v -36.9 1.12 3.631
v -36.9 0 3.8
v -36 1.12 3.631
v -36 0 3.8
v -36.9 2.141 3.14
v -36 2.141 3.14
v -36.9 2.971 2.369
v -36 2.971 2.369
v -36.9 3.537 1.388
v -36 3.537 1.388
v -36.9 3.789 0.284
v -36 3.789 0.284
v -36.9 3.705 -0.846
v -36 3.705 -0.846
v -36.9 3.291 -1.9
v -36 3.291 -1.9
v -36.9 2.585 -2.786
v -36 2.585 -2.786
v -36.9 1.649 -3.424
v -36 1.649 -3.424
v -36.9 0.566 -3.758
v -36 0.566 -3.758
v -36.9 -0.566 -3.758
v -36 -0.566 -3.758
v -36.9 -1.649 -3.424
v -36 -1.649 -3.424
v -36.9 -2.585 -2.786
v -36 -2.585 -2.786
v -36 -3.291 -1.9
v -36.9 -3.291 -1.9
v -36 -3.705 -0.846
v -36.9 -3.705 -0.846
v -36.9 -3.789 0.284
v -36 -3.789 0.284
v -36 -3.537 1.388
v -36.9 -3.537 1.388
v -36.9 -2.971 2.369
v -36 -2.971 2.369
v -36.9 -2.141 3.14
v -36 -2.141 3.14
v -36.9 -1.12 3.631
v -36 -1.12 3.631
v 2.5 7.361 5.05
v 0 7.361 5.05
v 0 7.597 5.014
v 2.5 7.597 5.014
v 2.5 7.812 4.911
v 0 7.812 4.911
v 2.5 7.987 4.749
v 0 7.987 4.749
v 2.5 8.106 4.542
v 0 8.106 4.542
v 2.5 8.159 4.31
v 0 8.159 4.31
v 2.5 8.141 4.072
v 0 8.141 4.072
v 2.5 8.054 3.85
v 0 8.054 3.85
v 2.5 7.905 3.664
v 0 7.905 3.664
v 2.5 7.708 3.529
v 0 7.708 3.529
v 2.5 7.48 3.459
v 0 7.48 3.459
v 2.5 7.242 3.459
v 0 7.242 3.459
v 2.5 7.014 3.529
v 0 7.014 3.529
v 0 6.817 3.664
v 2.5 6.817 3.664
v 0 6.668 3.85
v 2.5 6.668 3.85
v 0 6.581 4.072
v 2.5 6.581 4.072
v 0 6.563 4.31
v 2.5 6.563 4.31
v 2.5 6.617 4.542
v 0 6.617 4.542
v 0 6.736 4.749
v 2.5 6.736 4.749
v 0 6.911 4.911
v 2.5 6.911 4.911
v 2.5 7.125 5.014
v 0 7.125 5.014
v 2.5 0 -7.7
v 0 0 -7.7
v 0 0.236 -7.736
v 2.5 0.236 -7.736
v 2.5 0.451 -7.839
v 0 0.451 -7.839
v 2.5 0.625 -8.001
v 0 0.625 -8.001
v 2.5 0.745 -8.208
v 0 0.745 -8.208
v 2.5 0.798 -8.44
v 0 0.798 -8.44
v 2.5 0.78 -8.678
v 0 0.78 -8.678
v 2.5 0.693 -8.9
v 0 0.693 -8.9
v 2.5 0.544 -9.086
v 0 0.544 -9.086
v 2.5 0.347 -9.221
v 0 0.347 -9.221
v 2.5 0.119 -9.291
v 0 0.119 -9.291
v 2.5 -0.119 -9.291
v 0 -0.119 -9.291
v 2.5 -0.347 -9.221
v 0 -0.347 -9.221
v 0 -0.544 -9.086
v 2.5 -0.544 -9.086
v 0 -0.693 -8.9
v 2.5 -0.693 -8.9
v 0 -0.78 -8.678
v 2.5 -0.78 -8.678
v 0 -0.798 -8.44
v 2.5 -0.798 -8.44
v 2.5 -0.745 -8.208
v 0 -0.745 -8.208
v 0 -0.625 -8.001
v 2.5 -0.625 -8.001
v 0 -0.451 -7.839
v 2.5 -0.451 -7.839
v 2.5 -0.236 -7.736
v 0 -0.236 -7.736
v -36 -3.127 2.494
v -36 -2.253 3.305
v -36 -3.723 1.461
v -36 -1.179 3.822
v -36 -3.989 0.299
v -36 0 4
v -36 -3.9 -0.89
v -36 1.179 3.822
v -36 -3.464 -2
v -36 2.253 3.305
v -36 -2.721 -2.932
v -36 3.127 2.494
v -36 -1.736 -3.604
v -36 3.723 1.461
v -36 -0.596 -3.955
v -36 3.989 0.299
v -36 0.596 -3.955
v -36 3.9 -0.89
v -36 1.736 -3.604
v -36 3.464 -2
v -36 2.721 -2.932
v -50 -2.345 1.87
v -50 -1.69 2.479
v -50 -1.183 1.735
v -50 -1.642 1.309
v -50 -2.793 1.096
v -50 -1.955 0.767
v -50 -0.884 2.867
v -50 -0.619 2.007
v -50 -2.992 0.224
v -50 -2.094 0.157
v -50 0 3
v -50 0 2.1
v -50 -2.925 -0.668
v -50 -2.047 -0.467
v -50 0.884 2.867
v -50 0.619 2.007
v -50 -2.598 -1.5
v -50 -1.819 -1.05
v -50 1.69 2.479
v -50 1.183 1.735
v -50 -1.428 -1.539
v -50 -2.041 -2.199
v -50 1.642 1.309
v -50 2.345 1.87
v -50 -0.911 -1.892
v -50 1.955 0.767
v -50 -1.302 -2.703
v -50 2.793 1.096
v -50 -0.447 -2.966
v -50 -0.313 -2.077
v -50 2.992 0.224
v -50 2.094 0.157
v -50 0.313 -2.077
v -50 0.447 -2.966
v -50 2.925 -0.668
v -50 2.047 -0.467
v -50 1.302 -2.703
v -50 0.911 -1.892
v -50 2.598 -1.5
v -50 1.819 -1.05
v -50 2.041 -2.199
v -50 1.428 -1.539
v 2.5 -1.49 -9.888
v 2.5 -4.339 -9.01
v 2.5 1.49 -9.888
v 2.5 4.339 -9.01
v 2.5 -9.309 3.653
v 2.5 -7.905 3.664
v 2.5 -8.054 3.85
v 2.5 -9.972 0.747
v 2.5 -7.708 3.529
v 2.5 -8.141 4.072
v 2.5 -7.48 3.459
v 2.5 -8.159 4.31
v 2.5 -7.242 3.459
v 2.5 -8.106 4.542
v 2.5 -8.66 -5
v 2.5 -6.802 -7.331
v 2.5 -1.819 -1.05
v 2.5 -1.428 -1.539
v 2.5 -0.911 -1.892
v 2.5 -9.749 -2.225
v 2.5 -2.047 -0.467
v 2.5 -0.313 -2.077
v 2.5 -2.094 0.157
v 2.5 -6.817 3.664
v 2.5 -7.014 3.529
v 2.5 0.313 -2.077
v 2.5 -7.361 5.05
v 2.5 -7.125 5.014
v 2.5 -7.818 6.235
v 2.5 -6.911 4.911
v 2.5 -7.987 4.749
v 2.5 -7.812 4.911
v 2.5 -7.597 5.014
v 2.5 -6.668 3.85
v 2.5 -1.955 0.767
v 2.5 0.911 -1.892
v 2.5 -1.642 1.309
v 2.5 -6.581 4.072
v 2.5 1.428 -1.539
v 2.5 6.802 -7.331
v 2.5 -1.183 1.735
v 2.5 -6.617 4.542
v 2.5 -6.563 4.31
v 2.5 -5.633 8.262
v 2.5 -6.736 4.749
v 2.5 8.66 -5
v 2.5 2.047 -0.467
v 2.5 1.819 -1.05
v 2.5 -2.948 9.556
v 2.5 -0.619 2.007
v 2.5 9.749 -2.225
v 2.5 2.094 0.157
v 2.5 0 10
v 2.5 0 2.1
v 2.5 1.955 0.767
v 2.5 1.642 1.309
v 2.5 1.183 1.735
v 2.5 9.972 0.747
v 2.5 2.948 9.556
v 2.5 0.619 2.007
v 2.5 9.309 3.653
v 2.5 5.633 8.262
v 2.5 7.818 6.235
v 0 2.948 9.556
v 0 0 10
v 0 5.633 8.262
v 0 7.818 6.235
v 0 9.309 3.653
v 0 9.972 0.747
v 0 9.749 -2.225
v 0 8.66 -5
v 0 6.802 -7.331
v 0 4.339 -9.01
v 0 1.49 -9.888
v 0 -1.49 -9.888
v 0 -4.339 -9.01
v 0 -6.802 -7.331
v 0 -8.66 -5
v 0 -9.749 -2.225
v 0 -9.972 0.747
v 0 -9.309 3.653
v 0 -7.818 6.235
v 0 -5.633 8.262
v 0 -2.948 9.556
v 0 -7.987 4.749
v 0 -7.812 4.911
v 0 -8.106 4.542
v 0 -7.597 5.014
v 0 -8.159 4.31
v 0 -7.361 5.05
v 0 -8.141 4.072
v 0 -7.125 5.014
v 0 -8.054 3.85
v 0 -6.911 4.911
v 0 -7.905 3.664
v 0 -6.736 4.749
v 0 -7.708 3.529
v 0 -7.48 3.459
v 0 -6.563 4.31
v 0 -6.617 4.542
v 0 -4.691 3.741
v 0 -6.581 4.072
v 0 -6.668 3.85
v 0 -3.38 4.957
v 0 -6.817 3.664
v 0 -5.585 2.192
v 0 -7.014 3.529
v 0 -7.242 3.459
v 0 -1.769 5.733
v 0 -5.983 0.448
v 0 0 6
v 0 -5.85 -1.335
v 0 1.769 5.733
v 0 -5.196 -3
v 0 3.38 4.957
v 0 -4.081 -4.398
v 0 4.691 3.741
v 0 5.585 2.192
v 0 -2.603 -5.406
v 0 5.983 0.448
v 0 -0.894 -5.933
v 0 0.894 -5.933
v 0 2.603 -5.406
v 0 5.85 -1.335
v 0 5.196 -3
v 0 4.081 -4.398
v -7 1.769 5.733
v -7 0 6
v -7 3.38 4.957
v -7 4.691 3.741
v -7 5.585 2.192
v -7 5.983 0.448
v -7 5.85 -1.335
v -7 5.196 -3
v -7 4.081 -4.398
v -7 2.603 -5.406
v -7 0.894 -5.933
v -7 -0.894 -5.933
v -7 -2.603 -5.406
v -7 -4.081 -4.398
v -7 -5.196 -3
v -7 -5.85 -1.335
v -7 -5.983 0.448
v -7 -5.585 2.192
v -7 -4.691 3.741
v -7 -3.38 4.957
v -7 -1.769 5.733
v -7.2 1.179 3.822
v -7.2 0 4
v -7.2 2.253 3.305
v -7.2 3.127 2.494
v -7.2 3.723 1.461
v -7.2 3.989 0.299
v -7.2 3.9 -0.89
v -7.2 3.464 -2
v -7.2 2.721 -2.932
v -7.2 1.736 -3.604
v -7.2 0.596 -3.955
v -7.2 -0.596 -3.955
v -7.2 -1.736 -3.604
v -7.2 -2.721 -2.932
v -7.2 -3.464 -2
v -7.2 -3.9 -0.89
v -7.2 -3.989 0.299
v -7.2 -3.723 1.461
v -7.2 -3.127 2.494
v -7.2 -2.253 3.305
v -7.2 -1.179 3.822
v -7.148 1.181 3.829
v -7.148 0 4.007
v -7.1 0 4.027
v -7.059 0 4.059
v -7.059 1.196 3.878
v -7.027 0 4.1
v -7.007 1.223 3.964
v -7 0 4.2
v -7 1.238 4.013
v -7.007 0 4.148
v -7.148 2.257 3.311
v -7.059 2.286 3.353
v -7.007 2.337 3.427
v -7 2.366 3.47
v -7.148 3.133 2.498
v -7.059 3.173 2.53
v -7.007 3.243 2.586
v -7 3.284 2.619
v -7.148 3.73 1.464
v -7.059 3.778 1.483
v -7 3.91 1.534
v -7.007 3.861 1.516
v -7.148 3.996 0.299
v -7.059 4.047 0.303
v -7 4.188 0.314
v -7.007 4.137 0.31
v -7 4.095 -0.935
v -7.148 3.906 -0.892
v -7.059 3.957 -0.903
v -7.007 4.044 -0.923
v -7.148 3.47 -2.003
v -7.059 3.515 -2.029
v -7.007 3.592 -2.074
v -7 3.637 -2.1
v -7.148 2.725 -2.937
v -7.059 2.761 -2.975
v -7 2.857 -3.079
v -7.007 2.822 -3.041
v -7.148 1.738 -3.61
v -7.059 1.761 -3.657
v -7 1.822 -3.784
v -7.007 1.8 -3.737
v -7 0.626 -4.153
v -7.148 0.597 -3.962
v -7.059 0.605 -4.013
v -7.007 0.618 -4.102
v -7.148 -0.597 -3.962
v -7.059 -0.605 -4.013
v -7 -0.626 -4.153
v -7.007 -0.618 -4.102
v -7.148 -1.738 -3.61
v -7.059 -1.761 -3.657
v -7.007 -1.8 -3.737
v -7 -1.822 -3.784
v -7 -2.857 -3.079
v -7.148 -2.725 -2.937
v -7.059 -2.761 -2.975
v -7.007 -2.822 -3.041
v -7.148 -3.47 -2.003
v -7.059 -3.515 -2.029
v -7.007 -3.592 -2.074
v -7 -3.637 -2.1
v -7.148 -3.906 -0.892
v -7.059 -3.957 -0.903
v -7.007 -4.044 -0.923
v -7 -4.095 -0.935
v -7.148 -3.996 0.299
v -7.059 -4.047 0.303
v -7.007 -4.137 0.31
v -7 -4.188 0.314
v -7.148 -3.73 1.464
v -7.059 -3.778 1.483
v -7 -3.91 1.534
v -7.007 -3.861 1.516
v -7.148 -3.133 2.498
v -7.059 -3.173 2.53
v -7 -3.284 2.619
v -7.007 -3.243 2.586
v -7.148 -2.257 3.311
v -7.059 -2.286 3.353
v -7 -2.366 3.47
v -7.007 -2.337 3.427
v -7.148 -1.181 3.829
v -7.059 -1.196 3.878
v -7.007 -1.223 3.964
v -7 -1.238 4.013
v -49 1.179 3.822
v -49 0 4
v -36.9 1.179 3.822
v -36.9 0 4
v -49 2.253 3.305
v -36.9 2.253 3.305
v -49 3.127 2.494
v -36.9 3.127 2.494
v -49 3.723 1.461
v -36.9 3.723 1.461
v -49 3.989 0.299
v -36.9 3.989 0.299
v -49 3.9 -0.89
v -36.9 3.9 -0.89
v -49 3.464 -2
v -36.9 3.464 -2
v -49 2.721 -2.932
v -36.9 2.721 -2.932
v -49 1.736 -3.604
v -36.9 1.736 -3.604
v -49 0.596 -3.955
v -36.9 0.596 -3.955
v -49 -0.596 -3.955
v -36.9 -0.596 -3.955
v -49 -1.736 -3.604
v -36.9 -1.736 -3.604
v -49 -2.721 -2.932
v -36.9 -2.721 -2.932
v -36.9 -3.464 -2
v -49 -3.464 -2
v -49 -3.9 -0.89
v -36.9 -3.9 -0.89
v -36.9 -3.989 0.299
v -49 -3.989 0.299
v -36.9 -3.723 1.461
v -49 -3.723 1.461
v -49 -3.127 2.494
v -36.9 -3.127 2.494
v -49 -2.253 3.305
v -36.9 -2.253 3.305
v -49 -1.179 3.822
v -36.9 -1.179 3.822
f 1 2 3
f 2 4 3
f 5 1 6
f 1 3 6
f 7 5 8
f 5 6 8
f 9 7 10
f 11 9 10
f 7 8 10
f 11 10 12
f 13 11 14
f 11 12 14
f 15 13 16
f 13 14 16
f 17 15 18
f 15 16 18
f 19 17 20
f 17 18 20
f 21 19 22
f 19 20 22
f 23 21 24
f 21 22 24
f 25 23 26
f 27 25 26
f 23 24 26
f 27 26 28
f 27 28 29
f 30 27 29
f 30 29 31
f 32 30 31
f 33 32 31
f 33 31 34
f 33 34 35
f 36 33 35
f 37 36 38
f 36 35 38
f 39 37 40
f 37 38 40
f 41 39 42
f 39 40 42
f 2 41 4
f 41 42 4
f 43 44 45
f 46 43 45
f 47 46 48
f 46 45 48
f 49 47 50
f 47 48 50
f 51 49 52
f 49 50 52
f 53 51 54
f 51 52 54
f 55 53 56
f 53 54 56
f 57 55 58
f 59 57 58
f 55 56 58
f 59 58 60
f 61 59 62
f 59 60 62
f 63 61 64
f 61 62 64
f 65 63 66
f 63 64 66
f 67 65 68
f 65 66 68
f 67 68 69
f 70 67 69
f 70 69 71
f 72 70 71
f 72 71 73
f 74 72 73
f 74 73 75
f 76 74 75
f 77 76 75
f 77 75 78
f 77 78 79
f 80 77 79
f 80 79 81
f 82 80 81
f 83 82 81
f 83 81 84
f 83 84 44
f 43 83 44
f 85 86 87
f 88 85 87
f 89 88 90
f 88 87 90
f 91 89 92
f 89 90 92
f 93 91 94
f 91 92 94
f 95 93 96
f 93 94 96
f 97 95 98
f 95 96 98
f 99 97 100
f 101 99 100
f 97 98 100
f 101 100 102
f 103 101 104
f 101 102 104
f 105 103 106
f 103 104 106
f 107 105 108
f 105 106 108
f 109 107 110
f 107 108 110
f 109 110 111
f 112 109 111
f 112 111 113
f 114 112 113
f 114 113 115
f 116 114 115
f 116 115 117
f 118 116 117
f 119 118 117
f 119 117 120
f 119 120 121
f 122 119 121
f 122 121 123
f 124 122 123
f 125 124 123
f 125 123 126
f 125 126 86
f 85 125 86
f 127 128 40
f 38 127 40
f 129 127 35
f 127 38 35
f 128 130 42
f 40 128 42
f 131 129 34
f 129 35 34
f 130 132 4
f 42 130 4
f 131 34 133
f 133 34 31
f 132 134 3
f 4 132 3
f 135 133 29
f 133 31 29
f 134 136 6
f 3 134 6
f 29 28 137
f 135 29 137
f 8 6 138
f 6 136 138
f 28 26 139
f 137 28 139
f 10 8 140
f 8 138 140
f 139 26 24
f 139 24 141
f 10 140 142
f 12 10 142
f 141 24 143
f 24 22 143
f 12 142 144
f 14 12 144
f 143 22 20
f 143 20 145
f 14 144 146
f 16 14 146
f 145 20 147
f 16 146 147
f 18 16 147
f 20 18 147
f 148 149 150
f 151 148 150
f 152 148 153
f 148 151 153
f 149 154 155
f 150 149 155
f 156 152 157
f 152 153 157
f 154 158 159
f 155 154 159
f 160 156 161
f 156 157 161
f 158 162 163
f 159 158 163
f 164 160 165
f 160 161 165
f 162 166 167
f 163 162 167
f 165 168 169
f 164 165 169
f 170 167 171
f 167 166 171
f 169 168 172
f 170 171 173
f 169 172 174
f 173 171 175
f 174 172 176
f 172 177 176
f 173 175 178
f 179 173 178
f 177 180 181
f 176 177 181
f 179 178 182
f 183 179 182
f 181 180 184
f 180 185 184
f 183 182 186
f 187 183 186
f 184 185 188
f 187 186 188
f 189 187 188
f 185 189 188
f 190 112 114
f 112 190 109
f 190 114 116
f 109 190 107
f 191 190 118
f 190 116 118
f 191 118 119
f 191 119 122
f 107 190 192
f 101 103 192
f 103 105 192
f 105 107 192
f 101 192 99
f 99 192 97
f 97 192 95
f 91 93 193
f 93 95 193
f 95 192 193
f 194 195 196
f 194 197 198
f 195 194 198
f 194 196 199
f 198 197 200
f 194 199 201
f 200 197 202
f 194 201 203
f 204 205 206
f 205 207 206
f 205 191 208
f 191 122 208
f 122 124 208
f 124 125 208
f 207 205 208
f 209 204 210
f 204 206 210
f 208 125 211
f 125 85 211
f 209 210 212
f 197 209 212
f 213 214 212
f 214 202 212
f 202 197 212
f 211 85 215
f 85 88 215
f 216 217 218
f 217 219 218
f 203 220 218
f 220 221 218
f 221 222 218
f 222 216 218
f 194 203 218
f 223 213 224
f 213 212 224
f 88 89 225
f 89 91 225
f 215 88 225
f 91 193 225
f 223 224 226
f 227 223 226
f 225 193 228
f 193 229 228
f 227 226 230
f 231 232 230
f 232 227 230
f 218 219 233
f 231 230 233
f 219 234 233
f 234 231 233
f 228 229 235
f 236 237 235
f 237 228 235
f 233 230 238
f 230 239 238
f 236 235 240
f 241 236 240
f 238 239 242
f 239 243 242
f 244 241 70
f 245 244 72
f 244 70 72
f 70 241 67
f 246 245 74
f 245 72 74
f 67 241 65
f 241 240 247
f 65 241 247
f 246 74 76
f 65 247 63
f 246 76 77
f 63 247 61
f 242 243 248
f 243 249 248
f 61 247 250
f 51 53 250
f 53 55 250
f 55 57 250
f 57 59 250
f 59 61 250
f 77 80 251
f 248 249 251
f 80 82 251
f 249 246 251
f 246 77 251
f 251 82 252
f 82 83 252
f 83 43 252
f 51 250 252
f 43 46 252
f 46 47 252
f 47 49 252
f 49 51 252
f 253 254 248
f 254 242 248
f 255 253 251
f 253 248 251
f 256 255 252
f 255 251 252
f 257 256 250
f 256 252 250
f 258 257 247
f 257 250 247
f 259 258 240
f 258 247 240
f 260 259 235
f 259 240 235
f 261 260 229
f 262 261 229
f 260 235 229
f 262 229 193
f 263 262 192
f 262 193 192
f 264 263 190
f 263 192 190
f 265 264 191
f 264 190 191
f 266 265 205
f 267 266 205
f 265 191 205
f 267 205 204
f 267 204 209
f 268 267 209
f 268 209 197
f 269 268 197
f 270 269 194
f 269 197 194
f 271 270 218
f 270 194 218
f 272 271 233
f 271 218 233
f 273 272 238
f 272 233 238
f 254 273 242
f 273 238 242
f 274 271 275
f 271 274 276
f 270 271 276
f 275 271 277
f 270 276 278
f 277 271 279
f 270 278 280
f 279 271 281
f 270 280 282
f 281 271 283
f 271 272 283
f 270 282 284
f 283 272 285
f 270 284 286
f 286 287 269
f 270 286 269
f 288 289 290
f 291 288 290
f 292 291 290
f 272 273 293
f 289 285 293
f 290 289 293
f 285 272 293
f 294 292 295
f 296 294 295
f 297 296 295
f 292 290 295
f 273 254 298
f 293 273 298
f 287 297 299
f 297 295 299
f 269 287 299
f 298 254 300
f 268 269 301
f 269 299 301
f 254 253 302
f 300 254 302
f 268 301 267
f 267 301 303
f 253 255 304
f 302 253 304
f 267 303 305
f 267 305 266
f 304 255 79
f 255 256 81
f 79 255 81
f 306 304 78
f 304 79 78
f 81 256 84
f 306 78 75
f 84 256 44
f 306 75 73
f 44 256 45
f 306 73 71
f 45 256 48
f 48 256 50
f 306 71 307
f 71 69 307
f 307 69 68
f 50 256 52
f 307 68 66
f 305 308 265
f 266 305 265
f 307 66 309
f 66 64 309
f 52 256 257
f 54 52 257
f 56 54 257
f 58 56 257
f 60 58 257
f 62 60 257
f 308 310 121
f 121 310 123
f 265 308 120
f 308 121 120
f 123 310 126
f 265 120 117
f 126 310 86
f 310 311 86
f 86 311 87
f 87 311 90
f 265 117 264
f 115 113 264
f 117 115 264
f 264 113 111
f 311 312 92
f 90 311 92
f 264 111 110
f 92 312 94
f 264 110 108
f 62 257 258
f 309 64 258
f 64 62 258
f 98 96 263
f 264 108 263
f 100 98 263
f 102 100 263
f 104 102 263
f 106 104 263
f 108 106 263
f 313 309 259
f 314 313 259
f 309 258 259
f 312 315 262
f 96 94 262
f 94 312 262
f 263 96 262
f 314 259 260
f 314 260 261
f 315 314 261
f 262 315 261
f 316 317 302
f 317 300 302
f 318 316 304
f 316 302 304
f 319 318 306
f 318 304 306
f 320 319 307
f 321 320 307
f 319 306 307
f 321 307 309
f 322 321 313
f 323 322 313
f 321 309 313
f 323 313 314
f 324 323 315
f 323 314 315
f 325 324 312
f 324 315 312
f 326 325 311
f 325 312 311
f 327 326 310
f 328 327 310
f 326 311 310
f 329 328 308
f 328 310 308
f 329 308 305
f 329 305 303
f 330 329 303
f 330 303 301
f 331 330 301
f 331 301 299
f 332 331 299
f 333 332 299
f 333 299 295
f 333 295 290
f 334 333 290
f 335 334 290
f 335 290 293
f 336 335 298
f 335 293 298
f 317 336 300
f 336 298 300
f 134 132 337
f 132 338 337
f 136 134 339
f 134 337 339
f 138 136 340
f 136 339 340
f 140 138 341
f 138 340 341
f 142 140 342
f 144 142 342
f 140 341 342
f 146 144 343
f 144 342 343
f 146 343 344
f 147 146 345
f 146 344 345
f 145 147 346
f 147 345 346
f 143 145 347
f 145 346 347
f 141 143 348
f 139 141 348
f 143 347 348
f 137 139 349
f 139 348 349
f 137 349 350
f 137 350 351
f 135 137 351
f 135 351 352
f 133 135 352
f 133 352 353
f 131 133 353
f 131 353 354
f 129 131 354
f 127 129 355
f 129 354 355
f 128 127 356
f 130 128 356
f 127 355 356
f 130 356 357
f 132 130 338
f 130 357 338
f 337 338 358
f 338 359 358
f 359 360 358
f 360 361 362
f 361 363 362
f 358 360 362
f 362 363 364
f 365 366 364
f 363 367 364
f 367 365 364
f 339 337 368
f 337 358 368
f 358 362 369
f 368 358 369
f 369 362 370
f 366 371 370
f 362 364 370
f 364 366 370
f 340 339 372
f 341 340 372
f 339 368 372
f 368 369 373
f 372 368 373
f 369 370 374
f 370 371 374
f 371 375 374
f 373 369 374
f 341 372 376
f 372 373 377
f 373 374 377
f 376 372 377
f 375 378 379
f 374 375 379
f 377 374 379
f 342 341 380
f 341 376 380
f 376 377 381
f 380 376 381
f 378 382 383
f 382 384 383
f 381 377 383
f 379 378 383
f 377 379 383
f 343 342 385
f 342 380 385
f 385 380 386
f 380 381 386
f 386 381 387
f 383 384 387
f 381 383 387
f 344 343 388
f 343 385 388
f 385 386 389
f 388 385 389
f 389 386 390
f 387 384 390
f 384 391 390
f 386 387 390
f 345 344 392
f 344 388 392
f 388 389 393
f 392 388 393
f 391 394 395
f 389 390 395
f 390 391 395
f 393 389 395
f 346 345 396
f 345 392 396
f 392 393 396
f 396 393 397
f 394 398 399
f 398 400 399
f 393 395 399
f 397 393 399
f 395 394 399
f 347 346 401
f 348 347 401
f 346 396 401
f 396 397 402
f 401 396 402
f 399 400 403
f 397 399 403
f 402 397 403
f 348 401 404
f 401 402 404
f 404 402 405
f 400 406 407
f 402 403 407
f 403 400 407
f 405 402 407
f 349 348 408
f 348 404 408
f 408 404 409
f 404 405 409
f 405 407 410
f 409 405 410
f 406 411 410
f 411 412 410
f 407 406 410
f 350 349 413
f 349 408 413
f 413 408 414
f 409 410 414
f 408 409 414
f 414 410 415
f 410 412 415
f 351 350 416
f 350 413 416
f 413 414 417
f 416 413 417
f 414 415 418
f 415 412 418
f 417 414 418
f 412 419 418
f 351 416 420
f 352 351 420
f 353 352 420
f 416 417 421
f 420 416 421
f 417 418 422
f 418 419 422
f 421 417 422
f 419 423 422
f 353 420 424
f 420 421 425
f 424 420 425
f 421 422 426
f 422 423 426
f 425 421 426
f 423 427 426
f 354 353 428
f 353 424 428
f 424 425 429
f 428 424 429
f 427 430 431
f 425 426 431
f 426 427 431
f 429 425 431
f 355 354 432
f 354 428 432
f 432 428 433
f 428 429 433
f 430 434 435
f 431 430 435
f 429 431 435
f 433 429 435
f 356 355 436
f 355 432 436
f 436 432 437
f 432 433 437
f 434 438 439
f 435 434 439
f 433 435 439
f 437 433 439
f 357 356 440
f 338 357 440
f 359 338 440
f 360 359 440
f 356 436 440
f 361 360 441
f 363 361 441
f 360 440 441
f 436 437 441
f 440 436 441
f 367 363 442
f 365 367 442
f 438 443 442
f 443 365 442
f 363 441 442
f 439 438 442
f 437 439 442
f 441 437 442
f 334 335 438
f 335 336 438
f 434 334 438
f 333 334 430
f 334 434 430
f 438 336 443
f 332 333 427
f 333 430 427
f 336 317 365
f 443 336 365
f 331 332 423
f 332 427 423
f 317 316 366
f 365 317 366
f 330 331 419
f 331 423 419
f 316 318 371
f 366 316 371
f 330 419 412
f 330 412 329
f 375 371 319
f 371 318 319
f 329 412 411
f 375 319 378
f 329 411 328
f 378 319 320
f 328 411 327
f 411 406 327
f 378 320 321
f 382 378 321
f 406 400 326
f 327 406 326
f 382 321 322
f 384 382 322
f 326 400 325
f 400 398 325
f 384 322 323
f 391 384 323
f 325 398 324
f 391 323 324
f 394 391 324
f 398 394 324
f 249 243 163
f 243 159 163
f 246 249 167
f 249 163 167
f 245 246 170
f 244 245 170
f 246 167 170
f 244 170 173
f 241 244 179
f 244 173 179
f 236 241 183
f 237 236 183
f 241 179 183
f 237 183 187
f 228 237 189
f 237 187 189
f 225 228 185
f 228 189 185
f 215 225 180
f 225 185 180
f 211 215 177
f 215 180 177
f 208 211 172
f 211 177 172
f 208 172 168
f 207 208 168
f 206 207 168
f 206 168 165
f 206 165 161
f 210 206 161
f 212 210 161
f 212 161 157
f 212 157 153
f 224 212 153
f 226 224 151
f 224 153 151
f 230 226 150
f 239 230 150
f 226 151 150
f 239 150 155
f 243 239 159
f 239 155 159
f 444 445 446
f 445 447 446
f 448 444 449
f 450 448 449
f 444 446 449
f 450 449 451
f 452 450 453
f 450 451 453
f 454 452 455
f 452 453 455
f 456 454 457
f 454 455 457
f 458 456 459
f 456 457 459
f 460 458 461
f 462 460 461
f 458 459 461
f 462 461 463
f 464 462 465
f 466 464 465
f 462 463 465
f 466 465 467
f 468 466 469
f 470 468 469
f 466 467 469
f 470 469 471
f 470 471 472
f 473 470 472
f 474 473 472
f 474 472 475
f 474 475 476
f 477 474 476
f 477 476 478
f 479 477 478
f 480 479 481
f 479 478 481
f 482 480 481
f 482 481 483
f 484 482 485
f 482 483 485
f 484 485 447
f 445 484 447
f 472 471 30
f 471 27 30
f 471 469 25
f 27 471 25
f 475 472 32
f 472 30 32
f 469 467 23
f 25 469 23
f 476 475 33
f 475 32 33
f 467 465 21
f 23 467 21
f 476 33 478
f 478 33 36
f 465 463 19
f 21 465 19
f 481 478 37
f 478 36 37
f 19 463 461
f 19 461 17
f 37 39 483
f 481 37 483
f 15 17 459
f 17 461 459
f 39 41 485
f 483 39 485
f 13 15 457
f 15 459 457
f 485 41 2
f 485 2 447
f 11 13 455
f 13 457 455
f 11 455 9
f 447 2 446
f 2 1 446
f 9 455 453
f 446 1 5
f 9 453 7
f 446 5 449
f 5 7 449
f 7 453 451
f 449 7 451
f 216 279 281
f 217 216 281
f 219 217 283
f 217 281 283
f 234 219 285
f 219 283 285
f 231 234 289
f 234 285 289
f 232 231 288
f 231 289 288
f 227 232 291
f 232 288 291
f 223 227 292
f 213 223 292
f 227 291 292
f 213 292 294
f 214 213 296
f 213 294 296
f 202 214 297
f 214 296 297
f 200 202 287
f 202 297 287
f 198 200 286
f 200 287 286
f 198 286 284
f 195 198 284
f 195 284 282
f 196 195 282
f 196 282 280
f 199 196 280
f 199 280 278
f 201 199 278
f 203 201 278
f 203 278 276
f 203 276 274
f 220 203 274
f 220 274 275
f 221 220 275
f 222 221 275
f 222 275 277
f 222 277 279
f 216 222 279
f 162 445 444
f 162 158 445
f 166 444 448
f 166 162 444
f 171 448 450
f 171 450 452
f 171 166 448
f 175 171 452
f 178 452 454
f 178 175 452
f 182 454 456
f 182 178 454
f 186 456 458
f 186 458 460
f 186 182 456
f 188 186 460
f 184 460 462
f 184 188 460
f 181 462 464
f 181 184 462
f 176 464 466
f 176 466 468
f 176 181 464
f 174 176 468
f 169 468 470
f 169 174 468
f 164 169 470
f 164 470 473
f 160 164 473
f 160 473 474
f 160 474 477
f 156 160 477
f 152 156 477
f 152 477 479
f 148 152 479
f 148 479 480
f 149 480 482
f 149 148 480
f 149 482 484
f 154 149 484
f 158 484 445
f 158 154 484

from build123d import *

# Parameters (mm, degrees)
M2X0_4_TAPPED_HOLE1_D = 1.6


with BuildPart() as part:
    # Sketch1 → Revolve1 (revolve)
    with BuildSketch(Plane(origin=(0, 0, 0), x_dir=(-1, 0, 0), z_dir=(0, 0, -1)), mode=Mode.PRIVATE) as revolve1_sk:
        with BuildLine():
            Line((50, 2.1), (50, 3))
            add(Edge.make_bspline(
                [(49, 4), (49.333333333, 3.666666667), (49.666666667, 3.333333333), (50, 3)],
                knots=[0, 0, 0, 0, 1, 1, 1, 1], degree=3))
            Line((49, 4), (36.9, 4))
            Line((36.9, 4), (36.9, 3.8))
            Line((36.9, 3.8), (36, 3.8))
            Line((36, 3.8), (36, 4))
            Line((36, 4), (7.2, 4))
            ThreePointArc((7.2, 4), (7.058578644, 4.058578644), (7, 4.2))
            Line((7, 4.2), (7, 6))
            Line((7, 6), (0, 6))
            Line((0, 6), (0, 10))
            Line((0, 10), (-2.5, 10))
            Line((-2.5, 10), (-2.5, 2.1))
            Line((-2.5, 2.1), (50, 2.1))
        make_face()
    revolve(revolve1_sk.sketch.rotate(Axis((0, 0, 0), (-1, 0, 0)), 270), axis=Axis((0, 0, 0), (-1, 0, 0)))

    # M2x0.4 Tapped Hole1 (through all)
    with Locations(Plane(origin=(2.5, 0, 0), x_dir=(0, 0, -1), z_dir=(1, 0, 0))):
        with Locations((8.5, 0), (-4.25, 7.361215932), (-4.25, -7.361215932)):
            Hole(M2X0_4_TAPPED_HOLE1_D / 2)


solid = part.part
